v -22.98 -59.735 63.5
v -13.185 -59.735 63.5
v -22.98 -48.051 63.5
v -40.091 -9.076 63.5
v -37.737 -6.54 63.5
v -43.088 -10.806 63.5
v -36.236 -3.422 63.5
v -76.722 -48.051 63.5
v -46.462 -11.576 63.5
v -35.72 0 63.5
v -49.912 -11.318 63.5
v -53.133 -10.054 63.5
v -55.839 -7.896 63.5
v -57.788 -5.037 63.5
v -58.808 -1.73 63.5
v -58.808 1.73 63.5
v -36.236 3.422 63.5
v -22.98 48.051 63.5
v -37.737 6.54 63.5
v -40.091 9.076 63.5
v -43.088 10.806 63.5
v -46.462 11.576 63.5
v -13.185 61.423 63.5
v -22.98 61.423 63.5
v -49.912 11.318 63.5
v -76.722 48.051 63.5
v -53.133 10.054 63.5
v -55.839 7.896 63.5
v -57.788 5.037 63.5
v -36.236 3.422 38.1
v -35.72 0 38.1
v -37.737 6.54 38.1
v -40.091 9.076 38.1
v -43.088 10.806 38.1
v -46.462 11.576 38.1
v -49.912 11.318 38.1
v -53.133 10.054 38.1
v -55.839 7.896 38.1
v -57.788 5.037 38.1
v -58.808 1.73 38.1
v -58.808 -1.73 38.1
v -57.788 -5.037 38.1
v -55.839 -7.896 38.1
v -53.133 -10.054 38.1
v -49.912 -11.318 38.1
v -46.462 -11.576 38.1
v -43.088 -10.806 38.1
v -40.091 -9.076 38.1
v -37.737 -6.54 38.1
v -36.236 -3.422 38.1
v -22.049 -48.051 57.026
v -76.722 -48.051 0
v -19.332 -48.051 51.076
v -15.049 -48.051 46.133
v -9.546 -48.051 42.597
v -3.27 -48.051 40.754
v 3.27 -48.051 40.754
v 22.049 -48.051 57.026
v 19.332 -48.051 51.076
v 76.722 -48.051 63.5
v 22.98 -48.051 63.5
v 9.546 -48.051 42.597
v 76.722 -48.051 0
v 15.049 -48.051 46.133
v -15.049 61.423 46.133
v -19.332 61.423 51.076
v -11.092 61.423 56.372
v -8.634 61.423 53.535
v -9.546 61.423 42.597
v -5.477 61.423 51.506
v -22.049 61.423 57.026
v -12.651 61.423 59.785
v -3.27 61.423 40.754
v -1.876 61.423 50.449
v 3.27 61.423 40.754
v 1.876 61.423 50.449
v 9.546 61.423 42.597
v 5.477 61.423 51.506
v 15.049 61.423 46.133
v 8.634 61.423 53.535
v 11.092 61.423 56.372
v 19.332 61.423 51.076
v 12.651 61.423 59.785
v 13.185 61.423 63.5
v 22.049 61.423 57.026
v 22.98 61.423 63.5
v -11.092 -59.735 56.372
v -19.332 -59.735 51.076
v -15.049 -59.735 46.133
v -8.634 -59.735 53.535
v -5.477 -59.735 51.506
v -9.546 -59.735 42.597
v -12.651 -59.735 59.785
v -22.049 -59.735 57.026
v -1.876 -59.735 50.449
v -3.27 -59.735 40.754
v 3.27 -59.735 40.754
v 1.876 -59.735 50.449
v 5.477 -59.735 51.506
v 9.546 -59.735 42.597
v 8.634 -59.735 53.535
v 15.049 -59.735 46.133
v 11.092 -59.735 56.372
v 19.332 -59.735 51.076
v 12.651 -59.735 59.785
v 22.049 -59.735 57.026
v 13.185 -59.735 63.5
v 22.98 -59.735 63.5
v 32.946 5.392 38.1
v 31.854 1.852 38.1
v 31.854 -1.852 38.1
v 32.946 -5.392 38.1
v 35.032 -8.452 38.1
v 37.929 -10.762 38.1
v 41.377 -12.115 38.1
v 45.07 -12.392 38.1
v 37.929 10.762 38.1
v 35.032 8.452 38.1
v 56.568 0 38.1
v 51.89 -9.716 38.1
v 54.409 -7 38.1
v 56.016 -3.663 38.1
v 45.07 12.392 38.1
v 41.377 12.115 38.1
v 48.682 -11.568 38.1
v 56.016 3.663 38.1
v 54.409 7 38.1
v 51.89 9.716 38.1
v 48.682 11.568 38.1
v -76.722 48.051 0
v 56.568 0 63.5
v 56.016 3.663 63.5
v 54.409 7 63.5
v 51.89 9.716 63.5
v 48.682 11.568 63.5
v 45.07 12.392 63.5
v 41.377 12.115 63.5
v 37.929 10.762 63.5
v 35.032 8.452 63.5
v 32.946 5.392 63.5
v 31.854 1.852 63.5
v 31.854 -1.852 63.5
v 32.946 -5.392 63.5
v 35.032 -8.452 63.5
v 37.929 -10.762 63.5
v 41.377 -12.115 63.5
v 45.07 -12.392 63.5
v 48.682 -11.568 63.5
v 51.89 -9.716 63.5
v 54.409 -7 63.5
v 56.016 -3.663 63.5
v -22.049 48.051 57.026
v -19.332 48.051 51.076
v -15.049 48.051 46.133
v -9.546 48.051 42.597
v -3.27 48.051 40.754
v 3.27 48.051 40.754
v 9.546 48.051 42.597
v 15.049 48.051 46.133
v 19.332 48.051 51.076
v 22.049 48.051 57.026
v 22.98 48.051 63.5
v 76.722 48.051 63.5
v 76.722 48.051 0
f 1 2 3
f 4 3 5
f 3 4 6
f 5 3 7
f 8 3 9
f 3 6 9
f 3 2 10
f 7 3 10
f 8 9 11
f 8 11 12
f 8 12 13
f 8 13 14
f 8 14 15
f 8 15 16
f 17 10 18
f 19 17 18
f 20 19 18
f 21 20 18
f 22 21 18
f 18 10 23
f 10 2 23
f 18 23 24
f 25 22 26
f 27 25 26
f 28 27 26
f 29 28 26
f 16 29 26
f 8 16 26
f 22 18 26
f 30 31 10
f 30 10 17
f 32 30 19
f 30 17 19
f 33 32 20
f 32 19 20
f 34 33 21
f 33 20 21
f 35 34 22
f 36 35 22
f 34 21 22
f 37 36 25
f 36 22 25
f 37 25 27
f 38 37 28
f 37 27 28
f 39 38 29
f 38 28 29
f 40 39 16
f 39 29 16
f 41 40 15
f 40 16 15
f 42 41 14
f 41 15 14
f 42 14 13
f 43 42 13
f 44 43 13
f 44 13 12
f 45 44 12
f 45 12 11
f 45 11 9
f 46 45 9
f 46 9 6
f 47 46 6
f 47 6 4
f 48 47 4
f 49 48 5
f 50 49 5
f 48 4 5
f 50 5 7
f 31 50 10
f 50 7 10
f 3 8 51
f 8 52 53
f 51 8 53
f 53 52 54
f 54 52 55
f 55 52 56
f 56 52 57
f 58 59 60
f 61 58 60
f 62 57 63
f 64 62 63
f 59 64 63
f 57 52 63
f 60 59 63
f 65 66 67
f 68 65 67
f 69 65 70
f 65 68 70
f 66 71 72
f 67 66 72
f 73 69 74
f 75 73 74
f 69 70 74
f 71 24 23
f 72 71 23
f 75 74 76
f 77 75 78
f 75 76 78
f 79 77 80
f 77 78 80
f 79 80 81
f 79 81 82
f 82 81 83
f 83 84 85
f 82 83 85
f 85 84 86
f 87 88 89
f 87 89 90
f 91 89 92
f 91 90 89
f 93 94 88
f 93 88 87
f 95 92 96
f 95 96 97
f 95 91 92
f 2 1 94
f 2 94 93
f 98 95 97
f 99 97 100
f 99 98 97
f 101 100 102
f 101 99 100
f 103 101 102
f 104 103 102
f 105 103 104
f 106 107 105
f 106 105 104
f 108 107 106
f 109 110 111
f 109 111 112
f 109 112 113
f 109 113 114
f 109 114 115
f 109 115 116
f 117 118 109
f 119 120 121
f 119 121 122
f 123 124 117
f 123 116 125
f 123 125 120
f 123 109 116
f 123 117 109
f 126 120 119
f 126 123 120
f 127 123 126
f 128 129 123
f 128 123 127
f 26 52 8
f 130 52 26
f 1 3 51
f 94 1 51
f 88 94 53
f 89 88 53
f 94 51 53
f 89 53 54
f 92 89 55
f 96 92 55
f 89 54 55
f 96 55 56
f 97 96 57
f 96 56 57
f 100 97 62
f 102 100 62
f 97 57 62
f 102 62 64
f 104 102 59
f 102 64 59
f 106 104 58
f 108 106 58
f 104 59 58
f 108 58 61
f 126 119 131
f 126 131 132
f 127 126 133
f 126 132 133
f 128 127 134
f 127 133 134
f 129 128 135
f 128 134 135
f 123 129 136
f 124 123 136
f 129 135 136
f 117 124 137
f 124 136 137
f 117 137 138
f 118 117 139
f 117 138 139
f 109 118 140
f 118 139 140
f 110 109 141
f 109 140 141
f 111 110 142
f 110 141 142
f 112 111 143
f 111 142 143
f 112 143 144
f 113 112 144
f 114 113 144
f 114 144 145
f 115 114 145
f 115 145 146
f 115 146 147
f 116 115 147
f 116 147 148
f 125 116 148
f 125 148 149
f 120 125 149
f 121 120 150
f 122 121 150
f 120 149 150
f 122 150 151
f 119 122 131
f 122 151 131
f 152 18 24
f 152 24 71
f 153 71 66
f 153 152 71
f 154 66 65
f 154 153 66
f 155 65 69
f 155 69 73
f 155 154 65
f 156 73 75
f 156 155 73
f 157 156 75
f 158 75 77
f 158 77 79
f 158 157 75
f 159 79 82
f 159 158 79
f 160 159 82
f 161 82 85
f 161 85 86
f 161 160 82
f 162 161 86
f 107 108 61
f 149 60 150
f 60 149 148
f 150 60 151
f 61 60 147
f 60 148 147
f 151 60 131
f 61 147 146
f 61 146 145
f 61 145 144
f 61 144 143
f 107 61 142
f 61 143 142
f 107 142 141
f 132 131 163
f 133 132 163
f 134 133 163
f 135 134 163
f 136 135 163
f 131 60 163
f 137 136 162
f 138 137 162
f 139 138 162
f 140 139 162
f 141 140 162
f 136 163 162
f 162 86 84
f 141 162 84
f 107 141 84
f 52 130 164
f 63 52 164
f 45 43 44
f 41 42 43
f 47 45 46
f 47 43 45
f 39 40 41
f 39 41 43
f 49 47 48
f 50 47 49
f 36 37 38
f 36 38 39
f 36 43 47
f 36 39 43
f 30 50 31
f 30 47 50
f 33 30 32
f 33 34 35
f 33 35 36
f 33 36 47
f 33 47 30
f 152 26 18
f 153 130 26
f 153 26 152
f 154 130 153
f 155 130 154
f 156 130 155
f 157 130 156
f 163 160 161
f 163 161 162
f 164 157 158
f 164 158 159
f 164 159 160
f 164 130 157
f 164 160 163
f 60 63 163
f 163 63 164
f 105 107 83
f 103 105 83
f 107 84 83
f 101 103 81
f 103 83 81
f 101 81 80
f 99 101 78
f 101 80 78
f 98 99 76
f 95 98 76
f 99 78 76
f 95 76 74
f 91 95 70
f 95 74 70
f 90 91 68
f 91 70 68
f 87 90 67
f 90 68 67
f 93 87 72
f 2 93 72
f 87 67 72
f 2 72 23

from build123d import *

# Parameters (mm, degrees)
F0_W          = 153.443813324
F0_H          = 96.1026027799
F1_DEPTH      = 63.5
F2_R          = 11.6088535247
F2_R_2        = 12.4265954899
F3_DEPTH      = 25.4
F5_DEPTH      = 96.1036027799
F6_DEPTH      = 109.474
F6_DEPTH_BACK = 11.684


with BuildPart() as f1:
    # F0 (on Top) → F1 (new body)
    with BuildSketch(Plane.XY):
        Rectangle(F0_W, F0_H)
    extrude(amount=F1_DEPTH)

    # F2 (on face) → F3 (cut)
    with BuildSketch(Plane.XY.offset(63.5)):
        with Locations((-47.329030931, 0)):
            Circle(F2_R)
        with Locations((44.1418252885, 0)):
            Circle(F2_R_2)
    extrude(amount=-F3_DEPTH, mode=Mode.SUBTRACT)

    # F4 (on face) → F5 (cut, through all)
    with BuildSketch(Plane.XZ.offset(48.0513013899)):
        with BuildLine():
            ThreePointArc((-13.1851819962, 63.5), (0, 50.3148180038), (13.1851819962, 63.5))
            Line((13.1851819962, 63.5), (-13.1851819962, 63.5))
        make_face()
    extrude(amount=-F5_DEPTH, mode=Mode.SUBTRACT)

    # F4 (on face) → F6 (join, two sides)
    with BuildSketch(Plane.XZ.offset(48.0513013899)) as f6_sk:
        with BuildLine():
            ThreePointArc((-22.9800063856, 63.5), (0, 40.5199936144), (22.9800063856, 63.5))
            Line((22.9800063856, 63.5), (13.1851819962, 63.5))
            ThreePointArc((13.1851819962, 63.5), (0, 50.3148180038), (-13.1851819962, 63.5))
            Line((-13.1851819962, 63.5), (-22.9800063856, 63.5))
        make_face()
    extrude(amount=-F6_DEPTH)
    extrude(f6_sk.sketch, amount=F6_DEPTH_BACK)


solid = f1.part
